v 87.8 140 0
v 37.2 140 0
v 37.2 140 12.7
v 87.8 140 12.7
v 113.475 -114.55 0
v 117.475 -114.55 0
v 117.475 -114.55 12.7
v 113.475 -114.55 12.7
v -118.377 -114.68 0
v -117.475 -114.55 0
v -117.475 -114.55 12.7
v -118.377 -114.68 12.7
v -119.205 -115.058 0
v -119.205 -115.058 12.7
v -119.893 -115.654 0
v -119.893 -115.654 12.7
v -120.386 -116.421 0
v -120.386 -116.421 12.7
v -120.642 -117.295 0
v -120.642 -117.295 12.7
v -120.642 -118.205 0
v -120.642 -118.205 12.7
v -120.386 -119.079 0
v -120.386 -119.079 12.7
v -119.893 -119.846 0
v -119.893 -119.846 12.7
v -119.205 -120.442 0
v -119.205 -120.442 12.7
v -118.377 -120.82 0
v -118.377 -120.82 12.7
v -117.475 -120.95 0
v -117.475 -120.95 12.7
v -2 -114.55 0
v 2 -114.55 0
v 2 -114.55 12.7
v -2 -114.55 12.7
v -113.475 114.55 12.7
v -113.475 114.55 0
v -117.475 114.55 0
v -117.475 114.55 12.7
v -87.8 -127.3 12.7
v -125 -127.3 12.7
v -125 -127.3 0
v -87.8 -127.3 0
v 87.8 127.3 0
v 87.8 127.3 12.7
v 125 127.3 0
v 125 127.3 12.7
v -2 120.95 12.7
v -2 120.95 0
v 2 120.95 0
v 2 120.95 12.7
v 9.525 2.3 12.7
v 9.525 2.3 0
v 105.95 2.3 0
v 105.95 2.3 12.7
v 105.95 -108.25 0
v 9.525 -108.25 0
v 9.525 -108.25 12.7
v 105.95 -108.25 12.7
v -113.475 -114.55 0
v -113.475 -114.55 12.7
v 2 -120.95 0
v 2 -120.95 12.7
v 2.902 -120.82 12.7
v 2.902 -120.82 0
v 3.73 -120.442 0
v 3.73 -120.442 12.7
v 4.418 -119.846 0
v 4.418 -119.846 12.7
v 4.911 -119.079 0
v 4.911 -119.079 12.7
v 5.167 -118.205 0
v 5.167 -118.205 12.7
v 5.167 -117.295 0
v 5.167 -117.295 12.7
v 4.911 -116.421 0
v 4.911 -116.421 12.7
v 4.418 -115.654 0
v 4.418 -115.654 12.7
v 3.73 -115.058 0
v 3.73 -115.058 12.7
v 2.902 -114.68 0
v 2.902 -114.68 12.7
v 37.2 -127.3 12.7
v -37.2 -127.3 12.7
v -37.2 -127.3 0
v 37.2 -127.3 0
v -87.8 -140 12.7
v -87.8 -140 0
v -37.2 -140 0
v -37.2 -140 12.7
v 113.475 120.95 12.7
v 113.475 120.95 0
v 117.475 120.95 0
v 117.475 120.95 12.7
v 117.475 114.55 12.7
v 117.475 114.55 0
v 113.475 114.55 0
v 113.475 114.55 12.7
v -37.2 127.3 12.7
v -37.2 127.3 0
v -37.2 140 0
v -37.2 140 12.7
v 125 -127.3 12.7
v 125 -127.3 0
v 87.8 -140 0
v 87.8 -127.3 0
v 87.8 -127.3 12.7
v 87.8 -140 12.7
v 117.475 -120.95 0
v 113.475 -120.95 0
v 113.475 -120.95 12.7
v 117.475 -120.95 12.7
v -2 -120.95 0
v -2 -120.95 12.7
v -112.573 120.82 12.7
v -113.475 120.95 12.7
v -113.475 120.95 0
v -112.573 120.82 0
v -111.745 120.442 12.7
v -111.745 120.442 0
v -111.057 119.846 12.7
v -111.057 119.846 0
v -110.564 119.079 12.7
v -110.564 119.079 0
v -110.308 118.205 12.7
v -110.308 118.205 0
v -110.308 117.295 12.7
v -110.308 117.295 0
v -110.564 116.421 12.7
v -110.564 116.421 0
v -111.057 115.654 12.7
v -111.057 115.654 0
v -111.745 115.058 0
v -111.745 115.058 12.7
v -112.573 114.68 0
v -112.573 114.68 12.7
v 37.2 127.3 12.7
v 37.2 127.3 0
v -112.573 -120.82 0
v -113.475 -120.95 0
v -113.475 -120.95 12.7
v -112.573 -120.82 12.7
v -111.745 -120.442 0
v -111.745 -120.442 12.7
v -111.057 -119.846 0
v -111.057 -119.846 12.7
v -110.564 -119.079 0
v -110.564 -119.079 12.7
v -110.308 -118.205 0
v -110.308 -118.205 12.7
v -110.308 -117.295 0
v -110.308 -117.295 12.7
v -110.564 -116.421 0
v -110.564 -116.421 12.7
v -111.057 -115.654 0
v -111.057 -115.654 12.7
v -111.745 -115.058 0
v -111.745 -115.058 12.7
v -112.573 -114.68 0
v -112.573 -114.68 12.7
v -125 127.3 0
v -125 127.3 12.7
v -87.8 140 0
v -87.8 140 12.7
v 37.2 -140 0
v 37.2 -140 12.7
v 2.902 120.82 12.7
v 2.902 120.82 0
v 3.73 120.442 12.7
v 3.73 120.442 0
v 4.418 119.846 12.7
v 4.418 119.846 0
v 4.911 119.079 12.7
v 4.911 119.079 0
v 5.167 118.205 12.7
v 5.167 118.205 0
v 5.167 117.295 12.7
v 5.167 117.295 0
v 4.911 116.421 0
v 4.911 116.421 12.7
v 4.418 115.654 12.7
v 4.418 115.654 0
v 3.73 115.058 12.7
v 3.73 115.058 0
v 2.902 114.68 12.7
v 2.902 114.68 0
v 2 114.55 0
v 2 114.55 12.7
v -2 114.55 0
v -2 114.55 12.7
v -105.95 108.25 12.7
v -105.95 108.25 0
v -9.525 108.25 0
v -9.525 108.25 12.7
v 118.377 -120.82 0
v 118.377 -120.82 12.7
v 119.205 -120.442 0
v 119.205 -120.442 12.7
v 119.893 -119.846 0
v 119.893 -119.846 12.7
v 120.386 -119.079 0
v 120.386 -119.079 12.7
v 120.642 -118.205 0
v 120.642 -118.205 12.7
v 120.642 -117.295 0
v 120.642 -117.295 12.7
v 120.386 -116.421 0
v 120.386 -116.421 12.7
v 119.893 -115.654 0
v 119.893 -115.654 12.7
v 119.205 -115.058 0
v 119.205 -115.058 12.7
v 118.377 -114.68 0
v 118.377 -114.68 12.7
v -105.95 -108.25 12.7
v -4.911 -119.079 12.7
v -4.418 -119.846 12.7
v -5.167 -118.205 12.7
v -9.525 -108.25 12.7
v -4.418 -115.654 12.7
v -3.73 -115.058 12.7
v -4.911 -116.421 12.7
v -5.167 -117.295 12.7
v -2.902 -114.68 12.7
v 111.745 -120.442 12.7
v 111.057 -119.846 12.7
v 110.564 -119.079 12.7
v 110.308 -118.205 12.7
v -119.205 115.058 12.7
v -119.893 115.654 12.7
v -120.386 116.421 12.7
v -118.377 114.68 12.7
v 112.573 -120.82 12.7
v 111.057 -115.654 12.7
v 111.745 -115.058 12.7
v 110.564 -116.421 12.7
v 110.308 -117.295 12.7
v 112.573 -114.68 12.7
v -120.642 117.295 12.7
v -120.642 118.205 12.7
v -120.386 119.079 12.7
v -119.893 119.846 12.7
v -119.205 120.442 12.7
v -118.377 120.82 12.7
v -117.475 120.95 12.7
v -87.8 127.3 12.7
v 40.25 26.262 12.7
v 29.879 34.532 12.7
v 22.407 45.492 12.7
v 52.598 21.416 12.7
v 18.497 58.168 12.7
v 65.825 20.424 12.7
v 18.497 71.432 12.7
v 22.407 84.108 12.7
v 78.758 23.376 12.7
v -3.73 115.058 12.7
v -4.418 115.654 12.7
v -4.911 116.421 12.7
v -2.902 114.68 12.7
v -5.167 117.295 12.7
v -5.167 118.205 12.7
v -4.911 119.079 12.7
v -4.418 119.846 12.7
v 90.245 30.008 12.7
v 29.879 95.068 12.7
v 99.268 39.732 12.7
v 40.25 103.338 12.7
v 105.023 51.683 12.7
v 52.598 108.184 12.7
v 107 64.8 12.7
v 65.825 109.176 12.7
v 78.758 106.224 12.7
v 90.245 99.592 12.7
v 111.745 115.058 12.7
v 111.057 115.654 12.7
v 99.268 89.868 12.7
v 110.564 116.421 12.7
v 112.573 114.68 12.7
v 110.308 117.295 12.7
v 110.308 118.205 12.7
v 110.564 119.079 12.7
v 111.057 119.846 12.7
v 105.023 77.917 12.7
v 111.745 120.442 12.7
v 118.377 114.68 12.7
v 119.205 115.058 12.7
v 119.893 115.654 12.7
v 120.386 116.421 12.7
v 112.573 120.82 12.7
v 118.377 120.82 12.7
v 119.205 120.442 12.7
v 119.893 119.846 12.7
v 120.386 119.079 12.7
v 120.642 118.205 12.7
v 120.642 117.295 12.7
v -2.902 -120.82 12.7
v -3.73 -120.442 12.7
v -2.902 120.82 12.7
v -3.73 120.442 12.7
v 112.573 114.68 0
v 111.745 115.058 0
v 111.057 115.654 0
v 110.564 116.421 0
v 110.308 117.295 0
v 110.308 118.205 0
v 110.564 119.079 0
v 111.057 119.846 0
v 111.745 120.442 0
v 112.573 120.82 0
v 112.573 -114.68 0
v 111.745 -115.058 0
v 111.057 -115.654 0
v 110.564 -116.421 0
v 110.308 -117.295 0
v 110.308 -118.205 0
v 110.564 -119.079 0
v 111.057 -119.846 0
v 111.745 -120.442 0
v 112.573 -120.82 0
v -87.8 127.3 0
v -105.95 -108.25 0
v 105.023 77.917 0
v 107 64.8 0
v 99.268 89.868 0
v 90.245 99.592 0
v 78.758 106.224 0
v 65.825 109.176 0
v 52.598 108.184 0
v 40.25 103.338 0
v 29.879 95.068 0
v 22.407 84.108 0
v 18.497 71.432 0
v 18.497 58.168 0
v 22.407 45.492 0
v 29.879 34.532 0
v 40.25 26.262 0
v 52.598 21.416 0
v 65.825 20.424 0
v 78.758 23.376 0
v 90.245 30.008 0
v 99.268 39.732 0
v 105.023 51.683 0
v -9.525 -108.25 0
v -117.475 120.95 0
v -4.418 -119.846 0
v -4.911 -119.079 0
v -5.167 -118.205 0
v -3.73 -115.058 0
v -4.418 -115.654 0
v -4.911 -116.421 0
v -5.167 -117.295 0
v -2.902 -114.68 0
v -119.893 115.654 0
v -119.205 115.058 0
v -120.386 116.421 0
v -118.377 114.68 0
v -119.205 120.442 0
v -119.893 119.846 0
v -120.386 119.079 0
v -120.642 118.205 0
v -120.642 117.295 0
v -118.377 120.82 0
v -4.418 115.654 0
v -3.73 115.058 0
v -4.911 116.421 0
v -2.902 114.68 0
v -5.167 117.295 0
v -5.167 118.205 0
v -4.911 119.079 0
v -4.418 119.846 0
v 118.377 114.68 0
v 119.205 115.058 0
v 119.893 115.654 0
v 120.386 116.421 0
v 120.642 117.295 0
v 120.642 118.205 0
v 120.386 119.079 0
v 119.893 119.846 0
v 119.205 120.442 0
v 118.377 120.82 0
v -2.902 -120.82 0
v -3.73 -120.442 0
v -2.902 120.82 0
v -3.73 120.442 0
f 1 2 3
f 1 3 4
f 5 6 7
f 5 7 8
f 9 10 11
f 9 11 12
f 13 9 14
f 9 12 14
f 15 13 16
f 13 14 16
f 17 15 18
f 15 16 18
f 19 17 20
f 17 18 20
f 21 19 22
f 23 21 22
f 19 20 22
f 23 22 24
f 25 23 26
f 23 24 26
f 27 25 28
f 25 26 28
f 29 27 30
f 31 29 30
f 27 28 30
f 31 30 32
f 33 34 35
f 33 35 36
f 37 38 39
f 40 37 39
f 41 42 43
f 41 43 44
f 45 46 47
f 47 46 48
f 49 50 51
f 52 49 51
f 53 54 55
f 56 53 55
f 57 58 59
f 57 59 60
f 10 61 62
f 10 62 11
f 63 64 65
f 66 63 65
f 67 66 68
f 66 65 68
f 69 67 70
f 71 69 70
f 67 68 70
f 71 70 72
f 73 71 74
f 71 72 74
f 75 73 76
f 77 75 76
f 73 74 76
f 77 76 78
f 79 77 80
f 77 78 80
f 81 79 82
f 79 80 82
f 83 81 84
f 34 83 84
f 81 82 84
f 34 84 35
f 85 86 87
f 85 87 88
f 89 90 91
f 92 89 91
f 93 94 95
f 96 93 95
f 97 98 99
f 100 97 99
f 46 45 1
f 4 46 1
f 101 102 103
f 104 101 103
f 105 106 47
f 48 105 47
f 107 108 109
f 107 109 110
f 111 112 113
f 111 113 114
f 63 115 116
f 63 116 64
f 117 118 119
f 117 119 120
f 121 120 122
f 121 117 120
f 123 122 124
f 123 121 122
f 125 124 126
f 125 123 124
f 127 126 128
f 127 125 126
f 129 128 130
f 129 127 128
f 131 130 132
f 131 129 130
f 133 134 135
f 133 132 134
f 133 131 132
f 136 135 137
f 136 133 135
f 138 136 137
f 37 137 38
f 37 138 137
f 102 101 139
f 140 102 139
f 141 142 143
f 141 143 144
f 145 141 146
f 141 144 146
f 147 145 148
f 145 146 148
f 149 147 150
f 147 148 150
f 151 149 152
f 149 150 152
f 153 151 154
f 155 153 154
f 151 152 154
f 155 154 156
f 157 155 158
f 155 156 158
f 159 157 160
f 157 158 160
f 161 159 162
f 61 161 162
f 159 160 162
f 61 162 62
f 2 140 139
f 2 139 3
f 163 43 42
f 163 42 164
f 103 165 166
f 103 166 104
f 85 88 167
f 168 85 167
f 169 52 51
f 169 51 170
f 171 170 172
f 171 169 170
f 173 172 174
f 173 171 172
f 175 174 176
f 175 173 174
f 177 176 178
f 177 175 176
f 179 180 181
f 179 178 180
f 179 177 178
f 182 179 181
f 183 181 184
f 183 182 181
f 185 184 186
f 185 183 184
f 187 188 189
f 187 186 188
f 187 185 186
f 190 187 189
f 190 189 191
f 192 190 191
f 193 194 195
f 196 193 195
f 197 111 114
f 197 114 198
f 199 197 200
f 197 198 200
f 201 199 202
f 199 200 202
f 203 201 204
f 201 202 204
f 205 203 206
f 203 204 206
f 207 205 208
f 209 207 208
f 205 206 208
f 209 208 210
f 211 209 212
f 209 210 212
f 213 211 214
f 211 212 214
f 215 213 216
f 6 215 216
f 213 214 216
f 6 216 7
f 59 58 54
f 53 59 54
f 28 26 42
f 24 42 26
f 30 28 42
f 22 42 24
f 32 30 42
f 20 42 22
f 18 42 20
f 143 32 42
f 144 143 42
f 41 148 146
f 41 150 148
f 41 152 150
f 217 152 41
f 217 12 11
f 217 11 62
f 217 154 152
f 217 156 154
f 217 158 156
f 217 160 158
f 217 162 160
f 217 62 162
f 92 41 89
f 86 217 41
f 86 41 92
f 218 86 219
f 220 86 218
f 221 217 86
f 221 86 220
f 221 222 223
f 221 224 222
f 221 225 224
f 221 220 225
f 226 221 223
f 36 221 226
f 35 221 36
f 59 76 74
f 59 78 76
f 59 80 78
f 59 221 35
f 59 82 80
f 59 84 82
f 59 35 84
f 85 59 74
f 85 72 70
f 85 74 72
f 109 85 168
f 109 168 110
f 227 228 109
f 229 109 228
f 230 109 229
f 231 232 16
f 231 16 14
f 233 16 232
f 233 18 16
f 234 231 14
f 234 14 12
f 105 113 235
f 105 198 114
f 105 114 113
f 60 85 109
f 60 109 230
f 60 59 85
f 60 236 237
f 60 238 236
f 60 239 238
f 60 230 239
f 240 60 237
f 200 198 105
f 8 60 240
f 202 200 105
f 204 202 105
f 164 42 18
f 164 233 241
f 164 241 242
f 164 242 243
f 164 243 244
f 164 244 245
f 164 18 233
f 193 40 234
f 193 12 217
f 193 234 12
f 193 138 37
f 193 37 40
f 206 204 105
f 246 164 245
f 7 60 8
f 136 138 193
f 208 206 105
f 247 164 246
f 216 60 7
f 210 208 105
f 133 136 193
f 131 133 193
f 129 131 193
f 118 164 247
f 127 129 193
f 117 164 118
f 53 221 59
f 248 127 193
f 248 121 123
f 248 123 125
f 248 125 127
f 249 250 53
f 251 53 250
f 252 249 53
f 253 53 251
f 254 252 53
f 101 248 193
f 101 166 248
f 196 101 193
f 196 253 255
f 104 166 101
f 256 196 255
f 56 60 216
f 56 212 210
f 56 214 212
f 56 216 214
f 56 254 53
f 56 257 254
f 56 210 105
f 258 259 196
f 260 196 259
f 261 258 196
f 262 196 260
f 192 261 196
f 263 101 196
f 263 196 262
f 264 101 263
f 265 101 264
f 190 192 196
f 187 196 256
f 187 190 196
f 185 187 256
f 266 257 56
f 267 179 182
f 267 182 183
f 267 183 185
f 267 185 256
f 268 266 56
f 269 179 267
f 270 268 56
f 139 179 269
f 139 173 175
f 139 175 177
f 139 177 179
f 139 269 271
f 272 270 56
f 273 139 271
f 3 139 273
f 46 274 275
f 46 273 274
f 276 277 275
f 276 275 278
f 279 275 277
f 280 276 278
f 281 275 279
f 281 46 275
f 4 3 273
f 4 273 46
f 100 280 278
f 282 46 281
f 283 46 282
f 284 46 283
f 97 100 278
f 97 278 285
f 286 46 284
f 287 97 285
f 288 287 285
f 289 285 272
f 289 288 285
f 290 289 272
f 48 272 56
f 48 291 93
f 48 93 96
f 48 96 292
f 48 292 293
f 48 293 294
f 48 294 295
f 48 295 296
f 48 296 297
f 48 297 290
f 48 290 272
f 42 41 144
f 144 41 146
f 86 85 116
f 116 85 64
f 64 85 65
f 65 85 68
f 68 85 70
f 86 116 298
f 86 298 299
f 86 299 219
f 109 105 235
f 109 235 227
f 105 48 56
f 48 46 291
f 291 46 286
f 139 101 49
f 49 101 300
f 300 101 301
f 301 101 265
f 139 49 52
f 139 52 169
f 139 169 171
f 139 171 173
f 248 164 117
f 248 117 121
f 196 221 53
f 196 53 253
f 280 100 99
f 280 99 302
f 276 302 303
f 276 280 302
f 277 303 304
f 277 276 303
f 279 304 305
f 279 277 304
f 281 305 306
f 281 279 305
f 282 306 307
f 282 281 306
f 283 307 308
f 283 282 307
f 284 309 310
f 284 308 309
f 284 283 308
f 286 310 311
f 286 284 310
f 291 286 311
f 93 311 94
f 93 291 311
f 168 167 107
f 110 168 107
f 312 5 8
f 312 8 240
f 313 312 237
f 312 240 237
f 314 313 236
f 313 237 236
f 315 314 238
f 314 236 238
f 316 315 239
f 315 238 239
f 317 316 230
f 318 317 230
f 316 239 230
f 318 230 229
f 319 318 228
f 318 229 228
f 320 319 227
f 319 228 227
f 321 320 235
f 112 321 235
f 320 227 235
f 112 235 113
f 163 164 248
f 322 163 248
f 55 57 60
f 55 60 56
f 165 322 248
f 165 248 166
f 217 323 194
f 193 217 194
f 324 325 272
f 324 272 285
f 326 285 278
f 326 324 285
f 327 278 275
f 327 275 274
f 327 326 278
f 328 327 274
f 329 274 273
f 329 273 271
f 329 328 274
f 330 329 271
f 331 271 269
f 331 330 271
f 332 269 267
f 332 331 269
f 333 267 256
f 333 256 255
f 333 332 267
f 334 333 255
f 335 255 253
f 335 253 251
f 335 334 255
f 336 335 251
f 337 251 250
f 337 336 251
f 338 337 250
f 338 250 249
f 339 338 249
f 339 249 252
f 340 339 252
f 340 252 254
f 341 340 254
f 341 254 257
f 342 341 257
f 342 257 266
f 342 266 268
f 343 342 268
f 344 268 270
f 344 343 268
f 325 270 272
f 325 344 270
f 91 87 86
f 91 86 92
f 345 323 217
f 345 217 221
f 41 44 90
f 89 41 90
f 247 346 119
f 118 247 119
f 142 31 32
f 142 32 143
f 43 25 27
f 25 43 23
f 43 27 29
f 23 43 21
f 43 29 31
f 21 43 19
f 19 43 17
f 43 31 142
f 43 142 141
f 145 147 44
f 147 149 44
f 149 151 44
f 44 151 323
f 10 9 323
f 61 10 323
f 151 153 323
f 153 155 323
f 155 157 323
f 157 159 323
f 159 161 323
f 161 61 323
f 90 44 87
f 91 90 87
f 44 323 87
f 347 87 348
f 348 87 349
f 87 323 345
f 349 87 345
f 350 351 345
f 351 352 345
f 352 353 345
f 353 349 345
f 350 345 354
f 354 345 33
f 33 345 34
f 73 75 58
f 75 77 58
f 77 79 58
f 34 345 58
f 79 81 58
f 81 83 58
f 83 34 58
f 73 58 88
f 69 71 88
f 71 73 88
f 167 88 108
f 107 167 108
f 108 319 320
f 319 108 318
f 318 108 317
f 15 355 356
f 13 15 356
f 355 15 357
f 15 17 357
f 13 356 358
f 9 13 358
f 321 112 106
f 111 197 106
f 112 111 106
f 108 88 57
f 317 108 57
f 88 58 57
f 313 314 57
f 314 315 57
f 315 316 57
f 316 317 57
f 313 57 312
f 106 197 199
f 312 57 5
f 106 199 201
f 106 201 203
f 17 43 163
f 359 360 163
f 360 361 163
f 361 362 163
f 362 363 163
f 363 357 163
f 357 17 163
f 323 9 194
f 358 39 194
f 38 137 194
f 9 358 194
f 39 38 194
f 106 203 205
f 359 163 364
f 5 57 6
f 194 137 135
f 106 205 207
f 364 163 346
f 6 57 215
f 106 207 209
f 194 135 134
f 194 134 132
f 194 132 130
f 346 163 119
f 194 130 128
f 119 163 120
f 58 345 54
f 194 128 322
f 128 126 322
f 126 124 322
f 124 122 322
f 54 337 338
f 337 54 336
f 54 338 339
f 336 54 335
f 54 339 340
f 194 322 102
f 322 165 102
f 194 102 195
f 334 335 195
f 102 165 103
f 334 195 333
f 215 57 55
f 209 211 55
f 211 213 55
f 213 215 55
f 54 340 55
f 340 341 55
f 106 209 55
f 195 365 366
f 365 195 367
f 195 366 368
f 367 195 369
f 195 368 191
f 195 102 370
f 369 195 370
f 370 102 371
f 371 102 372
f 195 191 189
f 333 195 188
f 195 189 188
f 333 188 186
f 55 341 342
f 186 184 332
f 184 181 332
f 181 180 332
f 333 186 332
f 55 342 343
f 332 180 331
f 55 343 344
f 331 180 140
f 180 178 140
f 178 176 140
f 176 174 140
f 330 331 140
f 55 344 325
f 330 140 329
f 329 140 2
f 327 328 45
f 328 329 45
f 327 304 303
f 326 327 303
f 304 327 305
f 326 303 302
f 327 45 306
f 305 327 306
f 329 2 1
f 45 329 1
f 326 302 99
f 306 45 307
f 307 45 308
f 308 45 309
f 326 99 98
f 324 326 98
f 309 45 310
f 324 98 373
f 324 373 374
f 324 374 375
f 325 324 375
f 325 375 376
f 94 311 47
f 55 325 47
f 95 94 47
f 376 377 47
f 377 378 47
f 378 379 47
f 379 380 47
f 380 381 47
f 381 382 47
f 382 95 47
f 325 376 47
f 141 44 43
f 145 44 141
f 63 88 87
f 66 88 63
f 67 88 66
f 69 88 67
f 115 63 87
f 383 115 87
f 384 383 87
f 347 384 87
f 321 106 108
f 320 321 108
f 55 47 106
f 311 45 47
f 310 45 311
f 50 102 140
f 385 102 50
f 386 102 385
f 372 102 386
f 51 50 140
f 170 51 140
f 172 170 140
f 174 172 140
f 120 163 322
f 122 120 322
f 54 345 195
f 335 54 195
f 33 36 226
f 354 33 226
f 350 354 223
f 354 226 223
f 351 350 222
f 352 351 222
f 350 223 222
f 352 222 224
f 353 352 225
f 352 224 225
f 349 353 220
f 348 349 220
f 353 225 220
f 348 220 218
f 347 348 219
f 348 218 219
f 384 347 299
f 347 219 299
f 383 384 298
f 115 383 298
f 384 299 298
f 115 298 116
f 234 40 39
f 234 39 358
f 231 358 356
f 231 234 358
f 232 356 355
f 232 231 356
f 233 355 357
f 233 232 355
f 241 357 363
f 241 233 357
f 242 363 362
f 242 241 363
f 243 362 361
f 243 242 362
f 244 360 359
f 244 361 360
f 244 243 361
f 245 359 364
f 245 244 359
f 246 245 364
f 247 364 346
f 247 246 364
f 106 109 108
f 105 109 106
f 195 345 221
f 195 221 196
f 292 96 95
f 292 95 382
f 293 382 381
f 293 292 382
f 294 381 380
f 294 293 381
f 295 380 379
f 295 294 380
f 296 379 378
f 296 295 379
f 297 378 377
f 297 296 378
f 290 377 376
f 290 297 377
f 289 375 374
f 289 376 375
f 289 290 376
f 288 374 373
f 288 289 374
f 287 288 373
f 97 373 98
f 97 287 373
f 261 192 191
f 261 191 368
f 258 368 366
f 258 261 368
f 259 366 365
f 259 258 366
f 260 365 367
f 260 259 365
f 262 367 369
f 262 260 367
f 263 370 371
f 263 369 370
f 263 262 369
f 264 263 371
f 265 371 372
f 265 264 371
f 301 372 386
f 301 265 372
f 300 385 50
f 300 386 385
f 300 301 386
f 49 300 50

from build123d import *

# Parameters (mm, degrees)
CROQUIS1_W              = 250
CROQUIS1_H              = 280
CROQUIS1_R              = 44.5
CROQUIS1_W_2            = 96.425
CROQUIS1_H_2            = 216.5
CROQUIS1_H_3            = 110.55
SALIENTE_EXTRUIR1_DEPTH = 12.7
CROQUIS2_W              = 37.2
CROQUIS2_H              = 12.7
CROQUIS2_W_2            = 74.4
CORTAR_EXTRUIR1_DEPTH   = 13.7


with BuildPart() as part:
    # Croquis1 → Saliente-Extruir1 (new body)
    with BuildSketch(Plane.XY):
        Rectangle(CROQUIS1_W, CROQUIS1_H)
        with Locations((62.5, 64.8)):
            Circle(CROQUIS1_R, mode=Mode.SUBTRACT)
        with Locations((-57.7375, 0)):
            Rectangle(CROQUIS1_W_2, CROQUIS1_H_2, mode=Mode.SUBTRACT)
        with Locations((57.7375, -52.975)):
            Rectangle(CROQUIS1_W_2, CROQUIS1_H_3, mode=Mode.SUBTRACT)
    extrude(amount=SALIENTE_EXTRUIR1_DEPTH)

    # Croquis2 → Cortar-Extruir1 (cut, through all)
    with BuildSketch(Plane.XY.offset(12.7)):
        with Locations((-106.4, 133.65)):
            Rectangle(CROQUIS2_W, CROQUIS2_H)
        with Locations((0, 133.65)):
            Rectangle(CROQUIS2_W_2, CROQUIS2_H)
        with Locations((106.4, 133.65)):
            Rectangle(CROQUIS2_W, CROQUIS2_H)
        with BuildLine():
            Line((-117.475, 120.95), (-113.475, 120.95))
            ThreePointArc((-113.475, 120.95), (-110.275, 117.75), (-113.475, 114.55))
            Line((-113.475, 114.55), (-117.475, 114.55))
            ThreePointArc((-117.475, 114.55), (-120.675, 117.75), (-117.475, 120.95))
        make_face()
        with BuildLine():
            Line((-2, 120.95), (2, 120.95))
            ThreePointArc((2, 120.95), (5.2, 117.75), (2, 114.55))
            Line((2, 114.55), (-2, 114.55))
            ThreePointArc((-2, 114.55), (-5.2, 117.75), (-2, 120.95))
        make_face()
        with BuildLine():
            Line((113.475, 120.95), (117.475, 120.95))
            ThreePointArc((117.475, 120.95), (120.675, 117.75), (117.475, 114.55))
            Line((117.475, 114.55), (113.475, 114.55))
            ThreePointArc((113.475, 114.55), (110.275, 117.75), (113.475, 120.95))
        make_face()
    cortar_extruir1 = extrude(amount=-CORTAR_EXTRUIR1_DEPTH, mode=Mode.SUBTRACT)

    # Simetría1: Cortar-Extruir1 across plane
    add(cortar_extruir1.mirror(Plane.ZX), mode=Mode.SUBTRACT)


solid = part.part
